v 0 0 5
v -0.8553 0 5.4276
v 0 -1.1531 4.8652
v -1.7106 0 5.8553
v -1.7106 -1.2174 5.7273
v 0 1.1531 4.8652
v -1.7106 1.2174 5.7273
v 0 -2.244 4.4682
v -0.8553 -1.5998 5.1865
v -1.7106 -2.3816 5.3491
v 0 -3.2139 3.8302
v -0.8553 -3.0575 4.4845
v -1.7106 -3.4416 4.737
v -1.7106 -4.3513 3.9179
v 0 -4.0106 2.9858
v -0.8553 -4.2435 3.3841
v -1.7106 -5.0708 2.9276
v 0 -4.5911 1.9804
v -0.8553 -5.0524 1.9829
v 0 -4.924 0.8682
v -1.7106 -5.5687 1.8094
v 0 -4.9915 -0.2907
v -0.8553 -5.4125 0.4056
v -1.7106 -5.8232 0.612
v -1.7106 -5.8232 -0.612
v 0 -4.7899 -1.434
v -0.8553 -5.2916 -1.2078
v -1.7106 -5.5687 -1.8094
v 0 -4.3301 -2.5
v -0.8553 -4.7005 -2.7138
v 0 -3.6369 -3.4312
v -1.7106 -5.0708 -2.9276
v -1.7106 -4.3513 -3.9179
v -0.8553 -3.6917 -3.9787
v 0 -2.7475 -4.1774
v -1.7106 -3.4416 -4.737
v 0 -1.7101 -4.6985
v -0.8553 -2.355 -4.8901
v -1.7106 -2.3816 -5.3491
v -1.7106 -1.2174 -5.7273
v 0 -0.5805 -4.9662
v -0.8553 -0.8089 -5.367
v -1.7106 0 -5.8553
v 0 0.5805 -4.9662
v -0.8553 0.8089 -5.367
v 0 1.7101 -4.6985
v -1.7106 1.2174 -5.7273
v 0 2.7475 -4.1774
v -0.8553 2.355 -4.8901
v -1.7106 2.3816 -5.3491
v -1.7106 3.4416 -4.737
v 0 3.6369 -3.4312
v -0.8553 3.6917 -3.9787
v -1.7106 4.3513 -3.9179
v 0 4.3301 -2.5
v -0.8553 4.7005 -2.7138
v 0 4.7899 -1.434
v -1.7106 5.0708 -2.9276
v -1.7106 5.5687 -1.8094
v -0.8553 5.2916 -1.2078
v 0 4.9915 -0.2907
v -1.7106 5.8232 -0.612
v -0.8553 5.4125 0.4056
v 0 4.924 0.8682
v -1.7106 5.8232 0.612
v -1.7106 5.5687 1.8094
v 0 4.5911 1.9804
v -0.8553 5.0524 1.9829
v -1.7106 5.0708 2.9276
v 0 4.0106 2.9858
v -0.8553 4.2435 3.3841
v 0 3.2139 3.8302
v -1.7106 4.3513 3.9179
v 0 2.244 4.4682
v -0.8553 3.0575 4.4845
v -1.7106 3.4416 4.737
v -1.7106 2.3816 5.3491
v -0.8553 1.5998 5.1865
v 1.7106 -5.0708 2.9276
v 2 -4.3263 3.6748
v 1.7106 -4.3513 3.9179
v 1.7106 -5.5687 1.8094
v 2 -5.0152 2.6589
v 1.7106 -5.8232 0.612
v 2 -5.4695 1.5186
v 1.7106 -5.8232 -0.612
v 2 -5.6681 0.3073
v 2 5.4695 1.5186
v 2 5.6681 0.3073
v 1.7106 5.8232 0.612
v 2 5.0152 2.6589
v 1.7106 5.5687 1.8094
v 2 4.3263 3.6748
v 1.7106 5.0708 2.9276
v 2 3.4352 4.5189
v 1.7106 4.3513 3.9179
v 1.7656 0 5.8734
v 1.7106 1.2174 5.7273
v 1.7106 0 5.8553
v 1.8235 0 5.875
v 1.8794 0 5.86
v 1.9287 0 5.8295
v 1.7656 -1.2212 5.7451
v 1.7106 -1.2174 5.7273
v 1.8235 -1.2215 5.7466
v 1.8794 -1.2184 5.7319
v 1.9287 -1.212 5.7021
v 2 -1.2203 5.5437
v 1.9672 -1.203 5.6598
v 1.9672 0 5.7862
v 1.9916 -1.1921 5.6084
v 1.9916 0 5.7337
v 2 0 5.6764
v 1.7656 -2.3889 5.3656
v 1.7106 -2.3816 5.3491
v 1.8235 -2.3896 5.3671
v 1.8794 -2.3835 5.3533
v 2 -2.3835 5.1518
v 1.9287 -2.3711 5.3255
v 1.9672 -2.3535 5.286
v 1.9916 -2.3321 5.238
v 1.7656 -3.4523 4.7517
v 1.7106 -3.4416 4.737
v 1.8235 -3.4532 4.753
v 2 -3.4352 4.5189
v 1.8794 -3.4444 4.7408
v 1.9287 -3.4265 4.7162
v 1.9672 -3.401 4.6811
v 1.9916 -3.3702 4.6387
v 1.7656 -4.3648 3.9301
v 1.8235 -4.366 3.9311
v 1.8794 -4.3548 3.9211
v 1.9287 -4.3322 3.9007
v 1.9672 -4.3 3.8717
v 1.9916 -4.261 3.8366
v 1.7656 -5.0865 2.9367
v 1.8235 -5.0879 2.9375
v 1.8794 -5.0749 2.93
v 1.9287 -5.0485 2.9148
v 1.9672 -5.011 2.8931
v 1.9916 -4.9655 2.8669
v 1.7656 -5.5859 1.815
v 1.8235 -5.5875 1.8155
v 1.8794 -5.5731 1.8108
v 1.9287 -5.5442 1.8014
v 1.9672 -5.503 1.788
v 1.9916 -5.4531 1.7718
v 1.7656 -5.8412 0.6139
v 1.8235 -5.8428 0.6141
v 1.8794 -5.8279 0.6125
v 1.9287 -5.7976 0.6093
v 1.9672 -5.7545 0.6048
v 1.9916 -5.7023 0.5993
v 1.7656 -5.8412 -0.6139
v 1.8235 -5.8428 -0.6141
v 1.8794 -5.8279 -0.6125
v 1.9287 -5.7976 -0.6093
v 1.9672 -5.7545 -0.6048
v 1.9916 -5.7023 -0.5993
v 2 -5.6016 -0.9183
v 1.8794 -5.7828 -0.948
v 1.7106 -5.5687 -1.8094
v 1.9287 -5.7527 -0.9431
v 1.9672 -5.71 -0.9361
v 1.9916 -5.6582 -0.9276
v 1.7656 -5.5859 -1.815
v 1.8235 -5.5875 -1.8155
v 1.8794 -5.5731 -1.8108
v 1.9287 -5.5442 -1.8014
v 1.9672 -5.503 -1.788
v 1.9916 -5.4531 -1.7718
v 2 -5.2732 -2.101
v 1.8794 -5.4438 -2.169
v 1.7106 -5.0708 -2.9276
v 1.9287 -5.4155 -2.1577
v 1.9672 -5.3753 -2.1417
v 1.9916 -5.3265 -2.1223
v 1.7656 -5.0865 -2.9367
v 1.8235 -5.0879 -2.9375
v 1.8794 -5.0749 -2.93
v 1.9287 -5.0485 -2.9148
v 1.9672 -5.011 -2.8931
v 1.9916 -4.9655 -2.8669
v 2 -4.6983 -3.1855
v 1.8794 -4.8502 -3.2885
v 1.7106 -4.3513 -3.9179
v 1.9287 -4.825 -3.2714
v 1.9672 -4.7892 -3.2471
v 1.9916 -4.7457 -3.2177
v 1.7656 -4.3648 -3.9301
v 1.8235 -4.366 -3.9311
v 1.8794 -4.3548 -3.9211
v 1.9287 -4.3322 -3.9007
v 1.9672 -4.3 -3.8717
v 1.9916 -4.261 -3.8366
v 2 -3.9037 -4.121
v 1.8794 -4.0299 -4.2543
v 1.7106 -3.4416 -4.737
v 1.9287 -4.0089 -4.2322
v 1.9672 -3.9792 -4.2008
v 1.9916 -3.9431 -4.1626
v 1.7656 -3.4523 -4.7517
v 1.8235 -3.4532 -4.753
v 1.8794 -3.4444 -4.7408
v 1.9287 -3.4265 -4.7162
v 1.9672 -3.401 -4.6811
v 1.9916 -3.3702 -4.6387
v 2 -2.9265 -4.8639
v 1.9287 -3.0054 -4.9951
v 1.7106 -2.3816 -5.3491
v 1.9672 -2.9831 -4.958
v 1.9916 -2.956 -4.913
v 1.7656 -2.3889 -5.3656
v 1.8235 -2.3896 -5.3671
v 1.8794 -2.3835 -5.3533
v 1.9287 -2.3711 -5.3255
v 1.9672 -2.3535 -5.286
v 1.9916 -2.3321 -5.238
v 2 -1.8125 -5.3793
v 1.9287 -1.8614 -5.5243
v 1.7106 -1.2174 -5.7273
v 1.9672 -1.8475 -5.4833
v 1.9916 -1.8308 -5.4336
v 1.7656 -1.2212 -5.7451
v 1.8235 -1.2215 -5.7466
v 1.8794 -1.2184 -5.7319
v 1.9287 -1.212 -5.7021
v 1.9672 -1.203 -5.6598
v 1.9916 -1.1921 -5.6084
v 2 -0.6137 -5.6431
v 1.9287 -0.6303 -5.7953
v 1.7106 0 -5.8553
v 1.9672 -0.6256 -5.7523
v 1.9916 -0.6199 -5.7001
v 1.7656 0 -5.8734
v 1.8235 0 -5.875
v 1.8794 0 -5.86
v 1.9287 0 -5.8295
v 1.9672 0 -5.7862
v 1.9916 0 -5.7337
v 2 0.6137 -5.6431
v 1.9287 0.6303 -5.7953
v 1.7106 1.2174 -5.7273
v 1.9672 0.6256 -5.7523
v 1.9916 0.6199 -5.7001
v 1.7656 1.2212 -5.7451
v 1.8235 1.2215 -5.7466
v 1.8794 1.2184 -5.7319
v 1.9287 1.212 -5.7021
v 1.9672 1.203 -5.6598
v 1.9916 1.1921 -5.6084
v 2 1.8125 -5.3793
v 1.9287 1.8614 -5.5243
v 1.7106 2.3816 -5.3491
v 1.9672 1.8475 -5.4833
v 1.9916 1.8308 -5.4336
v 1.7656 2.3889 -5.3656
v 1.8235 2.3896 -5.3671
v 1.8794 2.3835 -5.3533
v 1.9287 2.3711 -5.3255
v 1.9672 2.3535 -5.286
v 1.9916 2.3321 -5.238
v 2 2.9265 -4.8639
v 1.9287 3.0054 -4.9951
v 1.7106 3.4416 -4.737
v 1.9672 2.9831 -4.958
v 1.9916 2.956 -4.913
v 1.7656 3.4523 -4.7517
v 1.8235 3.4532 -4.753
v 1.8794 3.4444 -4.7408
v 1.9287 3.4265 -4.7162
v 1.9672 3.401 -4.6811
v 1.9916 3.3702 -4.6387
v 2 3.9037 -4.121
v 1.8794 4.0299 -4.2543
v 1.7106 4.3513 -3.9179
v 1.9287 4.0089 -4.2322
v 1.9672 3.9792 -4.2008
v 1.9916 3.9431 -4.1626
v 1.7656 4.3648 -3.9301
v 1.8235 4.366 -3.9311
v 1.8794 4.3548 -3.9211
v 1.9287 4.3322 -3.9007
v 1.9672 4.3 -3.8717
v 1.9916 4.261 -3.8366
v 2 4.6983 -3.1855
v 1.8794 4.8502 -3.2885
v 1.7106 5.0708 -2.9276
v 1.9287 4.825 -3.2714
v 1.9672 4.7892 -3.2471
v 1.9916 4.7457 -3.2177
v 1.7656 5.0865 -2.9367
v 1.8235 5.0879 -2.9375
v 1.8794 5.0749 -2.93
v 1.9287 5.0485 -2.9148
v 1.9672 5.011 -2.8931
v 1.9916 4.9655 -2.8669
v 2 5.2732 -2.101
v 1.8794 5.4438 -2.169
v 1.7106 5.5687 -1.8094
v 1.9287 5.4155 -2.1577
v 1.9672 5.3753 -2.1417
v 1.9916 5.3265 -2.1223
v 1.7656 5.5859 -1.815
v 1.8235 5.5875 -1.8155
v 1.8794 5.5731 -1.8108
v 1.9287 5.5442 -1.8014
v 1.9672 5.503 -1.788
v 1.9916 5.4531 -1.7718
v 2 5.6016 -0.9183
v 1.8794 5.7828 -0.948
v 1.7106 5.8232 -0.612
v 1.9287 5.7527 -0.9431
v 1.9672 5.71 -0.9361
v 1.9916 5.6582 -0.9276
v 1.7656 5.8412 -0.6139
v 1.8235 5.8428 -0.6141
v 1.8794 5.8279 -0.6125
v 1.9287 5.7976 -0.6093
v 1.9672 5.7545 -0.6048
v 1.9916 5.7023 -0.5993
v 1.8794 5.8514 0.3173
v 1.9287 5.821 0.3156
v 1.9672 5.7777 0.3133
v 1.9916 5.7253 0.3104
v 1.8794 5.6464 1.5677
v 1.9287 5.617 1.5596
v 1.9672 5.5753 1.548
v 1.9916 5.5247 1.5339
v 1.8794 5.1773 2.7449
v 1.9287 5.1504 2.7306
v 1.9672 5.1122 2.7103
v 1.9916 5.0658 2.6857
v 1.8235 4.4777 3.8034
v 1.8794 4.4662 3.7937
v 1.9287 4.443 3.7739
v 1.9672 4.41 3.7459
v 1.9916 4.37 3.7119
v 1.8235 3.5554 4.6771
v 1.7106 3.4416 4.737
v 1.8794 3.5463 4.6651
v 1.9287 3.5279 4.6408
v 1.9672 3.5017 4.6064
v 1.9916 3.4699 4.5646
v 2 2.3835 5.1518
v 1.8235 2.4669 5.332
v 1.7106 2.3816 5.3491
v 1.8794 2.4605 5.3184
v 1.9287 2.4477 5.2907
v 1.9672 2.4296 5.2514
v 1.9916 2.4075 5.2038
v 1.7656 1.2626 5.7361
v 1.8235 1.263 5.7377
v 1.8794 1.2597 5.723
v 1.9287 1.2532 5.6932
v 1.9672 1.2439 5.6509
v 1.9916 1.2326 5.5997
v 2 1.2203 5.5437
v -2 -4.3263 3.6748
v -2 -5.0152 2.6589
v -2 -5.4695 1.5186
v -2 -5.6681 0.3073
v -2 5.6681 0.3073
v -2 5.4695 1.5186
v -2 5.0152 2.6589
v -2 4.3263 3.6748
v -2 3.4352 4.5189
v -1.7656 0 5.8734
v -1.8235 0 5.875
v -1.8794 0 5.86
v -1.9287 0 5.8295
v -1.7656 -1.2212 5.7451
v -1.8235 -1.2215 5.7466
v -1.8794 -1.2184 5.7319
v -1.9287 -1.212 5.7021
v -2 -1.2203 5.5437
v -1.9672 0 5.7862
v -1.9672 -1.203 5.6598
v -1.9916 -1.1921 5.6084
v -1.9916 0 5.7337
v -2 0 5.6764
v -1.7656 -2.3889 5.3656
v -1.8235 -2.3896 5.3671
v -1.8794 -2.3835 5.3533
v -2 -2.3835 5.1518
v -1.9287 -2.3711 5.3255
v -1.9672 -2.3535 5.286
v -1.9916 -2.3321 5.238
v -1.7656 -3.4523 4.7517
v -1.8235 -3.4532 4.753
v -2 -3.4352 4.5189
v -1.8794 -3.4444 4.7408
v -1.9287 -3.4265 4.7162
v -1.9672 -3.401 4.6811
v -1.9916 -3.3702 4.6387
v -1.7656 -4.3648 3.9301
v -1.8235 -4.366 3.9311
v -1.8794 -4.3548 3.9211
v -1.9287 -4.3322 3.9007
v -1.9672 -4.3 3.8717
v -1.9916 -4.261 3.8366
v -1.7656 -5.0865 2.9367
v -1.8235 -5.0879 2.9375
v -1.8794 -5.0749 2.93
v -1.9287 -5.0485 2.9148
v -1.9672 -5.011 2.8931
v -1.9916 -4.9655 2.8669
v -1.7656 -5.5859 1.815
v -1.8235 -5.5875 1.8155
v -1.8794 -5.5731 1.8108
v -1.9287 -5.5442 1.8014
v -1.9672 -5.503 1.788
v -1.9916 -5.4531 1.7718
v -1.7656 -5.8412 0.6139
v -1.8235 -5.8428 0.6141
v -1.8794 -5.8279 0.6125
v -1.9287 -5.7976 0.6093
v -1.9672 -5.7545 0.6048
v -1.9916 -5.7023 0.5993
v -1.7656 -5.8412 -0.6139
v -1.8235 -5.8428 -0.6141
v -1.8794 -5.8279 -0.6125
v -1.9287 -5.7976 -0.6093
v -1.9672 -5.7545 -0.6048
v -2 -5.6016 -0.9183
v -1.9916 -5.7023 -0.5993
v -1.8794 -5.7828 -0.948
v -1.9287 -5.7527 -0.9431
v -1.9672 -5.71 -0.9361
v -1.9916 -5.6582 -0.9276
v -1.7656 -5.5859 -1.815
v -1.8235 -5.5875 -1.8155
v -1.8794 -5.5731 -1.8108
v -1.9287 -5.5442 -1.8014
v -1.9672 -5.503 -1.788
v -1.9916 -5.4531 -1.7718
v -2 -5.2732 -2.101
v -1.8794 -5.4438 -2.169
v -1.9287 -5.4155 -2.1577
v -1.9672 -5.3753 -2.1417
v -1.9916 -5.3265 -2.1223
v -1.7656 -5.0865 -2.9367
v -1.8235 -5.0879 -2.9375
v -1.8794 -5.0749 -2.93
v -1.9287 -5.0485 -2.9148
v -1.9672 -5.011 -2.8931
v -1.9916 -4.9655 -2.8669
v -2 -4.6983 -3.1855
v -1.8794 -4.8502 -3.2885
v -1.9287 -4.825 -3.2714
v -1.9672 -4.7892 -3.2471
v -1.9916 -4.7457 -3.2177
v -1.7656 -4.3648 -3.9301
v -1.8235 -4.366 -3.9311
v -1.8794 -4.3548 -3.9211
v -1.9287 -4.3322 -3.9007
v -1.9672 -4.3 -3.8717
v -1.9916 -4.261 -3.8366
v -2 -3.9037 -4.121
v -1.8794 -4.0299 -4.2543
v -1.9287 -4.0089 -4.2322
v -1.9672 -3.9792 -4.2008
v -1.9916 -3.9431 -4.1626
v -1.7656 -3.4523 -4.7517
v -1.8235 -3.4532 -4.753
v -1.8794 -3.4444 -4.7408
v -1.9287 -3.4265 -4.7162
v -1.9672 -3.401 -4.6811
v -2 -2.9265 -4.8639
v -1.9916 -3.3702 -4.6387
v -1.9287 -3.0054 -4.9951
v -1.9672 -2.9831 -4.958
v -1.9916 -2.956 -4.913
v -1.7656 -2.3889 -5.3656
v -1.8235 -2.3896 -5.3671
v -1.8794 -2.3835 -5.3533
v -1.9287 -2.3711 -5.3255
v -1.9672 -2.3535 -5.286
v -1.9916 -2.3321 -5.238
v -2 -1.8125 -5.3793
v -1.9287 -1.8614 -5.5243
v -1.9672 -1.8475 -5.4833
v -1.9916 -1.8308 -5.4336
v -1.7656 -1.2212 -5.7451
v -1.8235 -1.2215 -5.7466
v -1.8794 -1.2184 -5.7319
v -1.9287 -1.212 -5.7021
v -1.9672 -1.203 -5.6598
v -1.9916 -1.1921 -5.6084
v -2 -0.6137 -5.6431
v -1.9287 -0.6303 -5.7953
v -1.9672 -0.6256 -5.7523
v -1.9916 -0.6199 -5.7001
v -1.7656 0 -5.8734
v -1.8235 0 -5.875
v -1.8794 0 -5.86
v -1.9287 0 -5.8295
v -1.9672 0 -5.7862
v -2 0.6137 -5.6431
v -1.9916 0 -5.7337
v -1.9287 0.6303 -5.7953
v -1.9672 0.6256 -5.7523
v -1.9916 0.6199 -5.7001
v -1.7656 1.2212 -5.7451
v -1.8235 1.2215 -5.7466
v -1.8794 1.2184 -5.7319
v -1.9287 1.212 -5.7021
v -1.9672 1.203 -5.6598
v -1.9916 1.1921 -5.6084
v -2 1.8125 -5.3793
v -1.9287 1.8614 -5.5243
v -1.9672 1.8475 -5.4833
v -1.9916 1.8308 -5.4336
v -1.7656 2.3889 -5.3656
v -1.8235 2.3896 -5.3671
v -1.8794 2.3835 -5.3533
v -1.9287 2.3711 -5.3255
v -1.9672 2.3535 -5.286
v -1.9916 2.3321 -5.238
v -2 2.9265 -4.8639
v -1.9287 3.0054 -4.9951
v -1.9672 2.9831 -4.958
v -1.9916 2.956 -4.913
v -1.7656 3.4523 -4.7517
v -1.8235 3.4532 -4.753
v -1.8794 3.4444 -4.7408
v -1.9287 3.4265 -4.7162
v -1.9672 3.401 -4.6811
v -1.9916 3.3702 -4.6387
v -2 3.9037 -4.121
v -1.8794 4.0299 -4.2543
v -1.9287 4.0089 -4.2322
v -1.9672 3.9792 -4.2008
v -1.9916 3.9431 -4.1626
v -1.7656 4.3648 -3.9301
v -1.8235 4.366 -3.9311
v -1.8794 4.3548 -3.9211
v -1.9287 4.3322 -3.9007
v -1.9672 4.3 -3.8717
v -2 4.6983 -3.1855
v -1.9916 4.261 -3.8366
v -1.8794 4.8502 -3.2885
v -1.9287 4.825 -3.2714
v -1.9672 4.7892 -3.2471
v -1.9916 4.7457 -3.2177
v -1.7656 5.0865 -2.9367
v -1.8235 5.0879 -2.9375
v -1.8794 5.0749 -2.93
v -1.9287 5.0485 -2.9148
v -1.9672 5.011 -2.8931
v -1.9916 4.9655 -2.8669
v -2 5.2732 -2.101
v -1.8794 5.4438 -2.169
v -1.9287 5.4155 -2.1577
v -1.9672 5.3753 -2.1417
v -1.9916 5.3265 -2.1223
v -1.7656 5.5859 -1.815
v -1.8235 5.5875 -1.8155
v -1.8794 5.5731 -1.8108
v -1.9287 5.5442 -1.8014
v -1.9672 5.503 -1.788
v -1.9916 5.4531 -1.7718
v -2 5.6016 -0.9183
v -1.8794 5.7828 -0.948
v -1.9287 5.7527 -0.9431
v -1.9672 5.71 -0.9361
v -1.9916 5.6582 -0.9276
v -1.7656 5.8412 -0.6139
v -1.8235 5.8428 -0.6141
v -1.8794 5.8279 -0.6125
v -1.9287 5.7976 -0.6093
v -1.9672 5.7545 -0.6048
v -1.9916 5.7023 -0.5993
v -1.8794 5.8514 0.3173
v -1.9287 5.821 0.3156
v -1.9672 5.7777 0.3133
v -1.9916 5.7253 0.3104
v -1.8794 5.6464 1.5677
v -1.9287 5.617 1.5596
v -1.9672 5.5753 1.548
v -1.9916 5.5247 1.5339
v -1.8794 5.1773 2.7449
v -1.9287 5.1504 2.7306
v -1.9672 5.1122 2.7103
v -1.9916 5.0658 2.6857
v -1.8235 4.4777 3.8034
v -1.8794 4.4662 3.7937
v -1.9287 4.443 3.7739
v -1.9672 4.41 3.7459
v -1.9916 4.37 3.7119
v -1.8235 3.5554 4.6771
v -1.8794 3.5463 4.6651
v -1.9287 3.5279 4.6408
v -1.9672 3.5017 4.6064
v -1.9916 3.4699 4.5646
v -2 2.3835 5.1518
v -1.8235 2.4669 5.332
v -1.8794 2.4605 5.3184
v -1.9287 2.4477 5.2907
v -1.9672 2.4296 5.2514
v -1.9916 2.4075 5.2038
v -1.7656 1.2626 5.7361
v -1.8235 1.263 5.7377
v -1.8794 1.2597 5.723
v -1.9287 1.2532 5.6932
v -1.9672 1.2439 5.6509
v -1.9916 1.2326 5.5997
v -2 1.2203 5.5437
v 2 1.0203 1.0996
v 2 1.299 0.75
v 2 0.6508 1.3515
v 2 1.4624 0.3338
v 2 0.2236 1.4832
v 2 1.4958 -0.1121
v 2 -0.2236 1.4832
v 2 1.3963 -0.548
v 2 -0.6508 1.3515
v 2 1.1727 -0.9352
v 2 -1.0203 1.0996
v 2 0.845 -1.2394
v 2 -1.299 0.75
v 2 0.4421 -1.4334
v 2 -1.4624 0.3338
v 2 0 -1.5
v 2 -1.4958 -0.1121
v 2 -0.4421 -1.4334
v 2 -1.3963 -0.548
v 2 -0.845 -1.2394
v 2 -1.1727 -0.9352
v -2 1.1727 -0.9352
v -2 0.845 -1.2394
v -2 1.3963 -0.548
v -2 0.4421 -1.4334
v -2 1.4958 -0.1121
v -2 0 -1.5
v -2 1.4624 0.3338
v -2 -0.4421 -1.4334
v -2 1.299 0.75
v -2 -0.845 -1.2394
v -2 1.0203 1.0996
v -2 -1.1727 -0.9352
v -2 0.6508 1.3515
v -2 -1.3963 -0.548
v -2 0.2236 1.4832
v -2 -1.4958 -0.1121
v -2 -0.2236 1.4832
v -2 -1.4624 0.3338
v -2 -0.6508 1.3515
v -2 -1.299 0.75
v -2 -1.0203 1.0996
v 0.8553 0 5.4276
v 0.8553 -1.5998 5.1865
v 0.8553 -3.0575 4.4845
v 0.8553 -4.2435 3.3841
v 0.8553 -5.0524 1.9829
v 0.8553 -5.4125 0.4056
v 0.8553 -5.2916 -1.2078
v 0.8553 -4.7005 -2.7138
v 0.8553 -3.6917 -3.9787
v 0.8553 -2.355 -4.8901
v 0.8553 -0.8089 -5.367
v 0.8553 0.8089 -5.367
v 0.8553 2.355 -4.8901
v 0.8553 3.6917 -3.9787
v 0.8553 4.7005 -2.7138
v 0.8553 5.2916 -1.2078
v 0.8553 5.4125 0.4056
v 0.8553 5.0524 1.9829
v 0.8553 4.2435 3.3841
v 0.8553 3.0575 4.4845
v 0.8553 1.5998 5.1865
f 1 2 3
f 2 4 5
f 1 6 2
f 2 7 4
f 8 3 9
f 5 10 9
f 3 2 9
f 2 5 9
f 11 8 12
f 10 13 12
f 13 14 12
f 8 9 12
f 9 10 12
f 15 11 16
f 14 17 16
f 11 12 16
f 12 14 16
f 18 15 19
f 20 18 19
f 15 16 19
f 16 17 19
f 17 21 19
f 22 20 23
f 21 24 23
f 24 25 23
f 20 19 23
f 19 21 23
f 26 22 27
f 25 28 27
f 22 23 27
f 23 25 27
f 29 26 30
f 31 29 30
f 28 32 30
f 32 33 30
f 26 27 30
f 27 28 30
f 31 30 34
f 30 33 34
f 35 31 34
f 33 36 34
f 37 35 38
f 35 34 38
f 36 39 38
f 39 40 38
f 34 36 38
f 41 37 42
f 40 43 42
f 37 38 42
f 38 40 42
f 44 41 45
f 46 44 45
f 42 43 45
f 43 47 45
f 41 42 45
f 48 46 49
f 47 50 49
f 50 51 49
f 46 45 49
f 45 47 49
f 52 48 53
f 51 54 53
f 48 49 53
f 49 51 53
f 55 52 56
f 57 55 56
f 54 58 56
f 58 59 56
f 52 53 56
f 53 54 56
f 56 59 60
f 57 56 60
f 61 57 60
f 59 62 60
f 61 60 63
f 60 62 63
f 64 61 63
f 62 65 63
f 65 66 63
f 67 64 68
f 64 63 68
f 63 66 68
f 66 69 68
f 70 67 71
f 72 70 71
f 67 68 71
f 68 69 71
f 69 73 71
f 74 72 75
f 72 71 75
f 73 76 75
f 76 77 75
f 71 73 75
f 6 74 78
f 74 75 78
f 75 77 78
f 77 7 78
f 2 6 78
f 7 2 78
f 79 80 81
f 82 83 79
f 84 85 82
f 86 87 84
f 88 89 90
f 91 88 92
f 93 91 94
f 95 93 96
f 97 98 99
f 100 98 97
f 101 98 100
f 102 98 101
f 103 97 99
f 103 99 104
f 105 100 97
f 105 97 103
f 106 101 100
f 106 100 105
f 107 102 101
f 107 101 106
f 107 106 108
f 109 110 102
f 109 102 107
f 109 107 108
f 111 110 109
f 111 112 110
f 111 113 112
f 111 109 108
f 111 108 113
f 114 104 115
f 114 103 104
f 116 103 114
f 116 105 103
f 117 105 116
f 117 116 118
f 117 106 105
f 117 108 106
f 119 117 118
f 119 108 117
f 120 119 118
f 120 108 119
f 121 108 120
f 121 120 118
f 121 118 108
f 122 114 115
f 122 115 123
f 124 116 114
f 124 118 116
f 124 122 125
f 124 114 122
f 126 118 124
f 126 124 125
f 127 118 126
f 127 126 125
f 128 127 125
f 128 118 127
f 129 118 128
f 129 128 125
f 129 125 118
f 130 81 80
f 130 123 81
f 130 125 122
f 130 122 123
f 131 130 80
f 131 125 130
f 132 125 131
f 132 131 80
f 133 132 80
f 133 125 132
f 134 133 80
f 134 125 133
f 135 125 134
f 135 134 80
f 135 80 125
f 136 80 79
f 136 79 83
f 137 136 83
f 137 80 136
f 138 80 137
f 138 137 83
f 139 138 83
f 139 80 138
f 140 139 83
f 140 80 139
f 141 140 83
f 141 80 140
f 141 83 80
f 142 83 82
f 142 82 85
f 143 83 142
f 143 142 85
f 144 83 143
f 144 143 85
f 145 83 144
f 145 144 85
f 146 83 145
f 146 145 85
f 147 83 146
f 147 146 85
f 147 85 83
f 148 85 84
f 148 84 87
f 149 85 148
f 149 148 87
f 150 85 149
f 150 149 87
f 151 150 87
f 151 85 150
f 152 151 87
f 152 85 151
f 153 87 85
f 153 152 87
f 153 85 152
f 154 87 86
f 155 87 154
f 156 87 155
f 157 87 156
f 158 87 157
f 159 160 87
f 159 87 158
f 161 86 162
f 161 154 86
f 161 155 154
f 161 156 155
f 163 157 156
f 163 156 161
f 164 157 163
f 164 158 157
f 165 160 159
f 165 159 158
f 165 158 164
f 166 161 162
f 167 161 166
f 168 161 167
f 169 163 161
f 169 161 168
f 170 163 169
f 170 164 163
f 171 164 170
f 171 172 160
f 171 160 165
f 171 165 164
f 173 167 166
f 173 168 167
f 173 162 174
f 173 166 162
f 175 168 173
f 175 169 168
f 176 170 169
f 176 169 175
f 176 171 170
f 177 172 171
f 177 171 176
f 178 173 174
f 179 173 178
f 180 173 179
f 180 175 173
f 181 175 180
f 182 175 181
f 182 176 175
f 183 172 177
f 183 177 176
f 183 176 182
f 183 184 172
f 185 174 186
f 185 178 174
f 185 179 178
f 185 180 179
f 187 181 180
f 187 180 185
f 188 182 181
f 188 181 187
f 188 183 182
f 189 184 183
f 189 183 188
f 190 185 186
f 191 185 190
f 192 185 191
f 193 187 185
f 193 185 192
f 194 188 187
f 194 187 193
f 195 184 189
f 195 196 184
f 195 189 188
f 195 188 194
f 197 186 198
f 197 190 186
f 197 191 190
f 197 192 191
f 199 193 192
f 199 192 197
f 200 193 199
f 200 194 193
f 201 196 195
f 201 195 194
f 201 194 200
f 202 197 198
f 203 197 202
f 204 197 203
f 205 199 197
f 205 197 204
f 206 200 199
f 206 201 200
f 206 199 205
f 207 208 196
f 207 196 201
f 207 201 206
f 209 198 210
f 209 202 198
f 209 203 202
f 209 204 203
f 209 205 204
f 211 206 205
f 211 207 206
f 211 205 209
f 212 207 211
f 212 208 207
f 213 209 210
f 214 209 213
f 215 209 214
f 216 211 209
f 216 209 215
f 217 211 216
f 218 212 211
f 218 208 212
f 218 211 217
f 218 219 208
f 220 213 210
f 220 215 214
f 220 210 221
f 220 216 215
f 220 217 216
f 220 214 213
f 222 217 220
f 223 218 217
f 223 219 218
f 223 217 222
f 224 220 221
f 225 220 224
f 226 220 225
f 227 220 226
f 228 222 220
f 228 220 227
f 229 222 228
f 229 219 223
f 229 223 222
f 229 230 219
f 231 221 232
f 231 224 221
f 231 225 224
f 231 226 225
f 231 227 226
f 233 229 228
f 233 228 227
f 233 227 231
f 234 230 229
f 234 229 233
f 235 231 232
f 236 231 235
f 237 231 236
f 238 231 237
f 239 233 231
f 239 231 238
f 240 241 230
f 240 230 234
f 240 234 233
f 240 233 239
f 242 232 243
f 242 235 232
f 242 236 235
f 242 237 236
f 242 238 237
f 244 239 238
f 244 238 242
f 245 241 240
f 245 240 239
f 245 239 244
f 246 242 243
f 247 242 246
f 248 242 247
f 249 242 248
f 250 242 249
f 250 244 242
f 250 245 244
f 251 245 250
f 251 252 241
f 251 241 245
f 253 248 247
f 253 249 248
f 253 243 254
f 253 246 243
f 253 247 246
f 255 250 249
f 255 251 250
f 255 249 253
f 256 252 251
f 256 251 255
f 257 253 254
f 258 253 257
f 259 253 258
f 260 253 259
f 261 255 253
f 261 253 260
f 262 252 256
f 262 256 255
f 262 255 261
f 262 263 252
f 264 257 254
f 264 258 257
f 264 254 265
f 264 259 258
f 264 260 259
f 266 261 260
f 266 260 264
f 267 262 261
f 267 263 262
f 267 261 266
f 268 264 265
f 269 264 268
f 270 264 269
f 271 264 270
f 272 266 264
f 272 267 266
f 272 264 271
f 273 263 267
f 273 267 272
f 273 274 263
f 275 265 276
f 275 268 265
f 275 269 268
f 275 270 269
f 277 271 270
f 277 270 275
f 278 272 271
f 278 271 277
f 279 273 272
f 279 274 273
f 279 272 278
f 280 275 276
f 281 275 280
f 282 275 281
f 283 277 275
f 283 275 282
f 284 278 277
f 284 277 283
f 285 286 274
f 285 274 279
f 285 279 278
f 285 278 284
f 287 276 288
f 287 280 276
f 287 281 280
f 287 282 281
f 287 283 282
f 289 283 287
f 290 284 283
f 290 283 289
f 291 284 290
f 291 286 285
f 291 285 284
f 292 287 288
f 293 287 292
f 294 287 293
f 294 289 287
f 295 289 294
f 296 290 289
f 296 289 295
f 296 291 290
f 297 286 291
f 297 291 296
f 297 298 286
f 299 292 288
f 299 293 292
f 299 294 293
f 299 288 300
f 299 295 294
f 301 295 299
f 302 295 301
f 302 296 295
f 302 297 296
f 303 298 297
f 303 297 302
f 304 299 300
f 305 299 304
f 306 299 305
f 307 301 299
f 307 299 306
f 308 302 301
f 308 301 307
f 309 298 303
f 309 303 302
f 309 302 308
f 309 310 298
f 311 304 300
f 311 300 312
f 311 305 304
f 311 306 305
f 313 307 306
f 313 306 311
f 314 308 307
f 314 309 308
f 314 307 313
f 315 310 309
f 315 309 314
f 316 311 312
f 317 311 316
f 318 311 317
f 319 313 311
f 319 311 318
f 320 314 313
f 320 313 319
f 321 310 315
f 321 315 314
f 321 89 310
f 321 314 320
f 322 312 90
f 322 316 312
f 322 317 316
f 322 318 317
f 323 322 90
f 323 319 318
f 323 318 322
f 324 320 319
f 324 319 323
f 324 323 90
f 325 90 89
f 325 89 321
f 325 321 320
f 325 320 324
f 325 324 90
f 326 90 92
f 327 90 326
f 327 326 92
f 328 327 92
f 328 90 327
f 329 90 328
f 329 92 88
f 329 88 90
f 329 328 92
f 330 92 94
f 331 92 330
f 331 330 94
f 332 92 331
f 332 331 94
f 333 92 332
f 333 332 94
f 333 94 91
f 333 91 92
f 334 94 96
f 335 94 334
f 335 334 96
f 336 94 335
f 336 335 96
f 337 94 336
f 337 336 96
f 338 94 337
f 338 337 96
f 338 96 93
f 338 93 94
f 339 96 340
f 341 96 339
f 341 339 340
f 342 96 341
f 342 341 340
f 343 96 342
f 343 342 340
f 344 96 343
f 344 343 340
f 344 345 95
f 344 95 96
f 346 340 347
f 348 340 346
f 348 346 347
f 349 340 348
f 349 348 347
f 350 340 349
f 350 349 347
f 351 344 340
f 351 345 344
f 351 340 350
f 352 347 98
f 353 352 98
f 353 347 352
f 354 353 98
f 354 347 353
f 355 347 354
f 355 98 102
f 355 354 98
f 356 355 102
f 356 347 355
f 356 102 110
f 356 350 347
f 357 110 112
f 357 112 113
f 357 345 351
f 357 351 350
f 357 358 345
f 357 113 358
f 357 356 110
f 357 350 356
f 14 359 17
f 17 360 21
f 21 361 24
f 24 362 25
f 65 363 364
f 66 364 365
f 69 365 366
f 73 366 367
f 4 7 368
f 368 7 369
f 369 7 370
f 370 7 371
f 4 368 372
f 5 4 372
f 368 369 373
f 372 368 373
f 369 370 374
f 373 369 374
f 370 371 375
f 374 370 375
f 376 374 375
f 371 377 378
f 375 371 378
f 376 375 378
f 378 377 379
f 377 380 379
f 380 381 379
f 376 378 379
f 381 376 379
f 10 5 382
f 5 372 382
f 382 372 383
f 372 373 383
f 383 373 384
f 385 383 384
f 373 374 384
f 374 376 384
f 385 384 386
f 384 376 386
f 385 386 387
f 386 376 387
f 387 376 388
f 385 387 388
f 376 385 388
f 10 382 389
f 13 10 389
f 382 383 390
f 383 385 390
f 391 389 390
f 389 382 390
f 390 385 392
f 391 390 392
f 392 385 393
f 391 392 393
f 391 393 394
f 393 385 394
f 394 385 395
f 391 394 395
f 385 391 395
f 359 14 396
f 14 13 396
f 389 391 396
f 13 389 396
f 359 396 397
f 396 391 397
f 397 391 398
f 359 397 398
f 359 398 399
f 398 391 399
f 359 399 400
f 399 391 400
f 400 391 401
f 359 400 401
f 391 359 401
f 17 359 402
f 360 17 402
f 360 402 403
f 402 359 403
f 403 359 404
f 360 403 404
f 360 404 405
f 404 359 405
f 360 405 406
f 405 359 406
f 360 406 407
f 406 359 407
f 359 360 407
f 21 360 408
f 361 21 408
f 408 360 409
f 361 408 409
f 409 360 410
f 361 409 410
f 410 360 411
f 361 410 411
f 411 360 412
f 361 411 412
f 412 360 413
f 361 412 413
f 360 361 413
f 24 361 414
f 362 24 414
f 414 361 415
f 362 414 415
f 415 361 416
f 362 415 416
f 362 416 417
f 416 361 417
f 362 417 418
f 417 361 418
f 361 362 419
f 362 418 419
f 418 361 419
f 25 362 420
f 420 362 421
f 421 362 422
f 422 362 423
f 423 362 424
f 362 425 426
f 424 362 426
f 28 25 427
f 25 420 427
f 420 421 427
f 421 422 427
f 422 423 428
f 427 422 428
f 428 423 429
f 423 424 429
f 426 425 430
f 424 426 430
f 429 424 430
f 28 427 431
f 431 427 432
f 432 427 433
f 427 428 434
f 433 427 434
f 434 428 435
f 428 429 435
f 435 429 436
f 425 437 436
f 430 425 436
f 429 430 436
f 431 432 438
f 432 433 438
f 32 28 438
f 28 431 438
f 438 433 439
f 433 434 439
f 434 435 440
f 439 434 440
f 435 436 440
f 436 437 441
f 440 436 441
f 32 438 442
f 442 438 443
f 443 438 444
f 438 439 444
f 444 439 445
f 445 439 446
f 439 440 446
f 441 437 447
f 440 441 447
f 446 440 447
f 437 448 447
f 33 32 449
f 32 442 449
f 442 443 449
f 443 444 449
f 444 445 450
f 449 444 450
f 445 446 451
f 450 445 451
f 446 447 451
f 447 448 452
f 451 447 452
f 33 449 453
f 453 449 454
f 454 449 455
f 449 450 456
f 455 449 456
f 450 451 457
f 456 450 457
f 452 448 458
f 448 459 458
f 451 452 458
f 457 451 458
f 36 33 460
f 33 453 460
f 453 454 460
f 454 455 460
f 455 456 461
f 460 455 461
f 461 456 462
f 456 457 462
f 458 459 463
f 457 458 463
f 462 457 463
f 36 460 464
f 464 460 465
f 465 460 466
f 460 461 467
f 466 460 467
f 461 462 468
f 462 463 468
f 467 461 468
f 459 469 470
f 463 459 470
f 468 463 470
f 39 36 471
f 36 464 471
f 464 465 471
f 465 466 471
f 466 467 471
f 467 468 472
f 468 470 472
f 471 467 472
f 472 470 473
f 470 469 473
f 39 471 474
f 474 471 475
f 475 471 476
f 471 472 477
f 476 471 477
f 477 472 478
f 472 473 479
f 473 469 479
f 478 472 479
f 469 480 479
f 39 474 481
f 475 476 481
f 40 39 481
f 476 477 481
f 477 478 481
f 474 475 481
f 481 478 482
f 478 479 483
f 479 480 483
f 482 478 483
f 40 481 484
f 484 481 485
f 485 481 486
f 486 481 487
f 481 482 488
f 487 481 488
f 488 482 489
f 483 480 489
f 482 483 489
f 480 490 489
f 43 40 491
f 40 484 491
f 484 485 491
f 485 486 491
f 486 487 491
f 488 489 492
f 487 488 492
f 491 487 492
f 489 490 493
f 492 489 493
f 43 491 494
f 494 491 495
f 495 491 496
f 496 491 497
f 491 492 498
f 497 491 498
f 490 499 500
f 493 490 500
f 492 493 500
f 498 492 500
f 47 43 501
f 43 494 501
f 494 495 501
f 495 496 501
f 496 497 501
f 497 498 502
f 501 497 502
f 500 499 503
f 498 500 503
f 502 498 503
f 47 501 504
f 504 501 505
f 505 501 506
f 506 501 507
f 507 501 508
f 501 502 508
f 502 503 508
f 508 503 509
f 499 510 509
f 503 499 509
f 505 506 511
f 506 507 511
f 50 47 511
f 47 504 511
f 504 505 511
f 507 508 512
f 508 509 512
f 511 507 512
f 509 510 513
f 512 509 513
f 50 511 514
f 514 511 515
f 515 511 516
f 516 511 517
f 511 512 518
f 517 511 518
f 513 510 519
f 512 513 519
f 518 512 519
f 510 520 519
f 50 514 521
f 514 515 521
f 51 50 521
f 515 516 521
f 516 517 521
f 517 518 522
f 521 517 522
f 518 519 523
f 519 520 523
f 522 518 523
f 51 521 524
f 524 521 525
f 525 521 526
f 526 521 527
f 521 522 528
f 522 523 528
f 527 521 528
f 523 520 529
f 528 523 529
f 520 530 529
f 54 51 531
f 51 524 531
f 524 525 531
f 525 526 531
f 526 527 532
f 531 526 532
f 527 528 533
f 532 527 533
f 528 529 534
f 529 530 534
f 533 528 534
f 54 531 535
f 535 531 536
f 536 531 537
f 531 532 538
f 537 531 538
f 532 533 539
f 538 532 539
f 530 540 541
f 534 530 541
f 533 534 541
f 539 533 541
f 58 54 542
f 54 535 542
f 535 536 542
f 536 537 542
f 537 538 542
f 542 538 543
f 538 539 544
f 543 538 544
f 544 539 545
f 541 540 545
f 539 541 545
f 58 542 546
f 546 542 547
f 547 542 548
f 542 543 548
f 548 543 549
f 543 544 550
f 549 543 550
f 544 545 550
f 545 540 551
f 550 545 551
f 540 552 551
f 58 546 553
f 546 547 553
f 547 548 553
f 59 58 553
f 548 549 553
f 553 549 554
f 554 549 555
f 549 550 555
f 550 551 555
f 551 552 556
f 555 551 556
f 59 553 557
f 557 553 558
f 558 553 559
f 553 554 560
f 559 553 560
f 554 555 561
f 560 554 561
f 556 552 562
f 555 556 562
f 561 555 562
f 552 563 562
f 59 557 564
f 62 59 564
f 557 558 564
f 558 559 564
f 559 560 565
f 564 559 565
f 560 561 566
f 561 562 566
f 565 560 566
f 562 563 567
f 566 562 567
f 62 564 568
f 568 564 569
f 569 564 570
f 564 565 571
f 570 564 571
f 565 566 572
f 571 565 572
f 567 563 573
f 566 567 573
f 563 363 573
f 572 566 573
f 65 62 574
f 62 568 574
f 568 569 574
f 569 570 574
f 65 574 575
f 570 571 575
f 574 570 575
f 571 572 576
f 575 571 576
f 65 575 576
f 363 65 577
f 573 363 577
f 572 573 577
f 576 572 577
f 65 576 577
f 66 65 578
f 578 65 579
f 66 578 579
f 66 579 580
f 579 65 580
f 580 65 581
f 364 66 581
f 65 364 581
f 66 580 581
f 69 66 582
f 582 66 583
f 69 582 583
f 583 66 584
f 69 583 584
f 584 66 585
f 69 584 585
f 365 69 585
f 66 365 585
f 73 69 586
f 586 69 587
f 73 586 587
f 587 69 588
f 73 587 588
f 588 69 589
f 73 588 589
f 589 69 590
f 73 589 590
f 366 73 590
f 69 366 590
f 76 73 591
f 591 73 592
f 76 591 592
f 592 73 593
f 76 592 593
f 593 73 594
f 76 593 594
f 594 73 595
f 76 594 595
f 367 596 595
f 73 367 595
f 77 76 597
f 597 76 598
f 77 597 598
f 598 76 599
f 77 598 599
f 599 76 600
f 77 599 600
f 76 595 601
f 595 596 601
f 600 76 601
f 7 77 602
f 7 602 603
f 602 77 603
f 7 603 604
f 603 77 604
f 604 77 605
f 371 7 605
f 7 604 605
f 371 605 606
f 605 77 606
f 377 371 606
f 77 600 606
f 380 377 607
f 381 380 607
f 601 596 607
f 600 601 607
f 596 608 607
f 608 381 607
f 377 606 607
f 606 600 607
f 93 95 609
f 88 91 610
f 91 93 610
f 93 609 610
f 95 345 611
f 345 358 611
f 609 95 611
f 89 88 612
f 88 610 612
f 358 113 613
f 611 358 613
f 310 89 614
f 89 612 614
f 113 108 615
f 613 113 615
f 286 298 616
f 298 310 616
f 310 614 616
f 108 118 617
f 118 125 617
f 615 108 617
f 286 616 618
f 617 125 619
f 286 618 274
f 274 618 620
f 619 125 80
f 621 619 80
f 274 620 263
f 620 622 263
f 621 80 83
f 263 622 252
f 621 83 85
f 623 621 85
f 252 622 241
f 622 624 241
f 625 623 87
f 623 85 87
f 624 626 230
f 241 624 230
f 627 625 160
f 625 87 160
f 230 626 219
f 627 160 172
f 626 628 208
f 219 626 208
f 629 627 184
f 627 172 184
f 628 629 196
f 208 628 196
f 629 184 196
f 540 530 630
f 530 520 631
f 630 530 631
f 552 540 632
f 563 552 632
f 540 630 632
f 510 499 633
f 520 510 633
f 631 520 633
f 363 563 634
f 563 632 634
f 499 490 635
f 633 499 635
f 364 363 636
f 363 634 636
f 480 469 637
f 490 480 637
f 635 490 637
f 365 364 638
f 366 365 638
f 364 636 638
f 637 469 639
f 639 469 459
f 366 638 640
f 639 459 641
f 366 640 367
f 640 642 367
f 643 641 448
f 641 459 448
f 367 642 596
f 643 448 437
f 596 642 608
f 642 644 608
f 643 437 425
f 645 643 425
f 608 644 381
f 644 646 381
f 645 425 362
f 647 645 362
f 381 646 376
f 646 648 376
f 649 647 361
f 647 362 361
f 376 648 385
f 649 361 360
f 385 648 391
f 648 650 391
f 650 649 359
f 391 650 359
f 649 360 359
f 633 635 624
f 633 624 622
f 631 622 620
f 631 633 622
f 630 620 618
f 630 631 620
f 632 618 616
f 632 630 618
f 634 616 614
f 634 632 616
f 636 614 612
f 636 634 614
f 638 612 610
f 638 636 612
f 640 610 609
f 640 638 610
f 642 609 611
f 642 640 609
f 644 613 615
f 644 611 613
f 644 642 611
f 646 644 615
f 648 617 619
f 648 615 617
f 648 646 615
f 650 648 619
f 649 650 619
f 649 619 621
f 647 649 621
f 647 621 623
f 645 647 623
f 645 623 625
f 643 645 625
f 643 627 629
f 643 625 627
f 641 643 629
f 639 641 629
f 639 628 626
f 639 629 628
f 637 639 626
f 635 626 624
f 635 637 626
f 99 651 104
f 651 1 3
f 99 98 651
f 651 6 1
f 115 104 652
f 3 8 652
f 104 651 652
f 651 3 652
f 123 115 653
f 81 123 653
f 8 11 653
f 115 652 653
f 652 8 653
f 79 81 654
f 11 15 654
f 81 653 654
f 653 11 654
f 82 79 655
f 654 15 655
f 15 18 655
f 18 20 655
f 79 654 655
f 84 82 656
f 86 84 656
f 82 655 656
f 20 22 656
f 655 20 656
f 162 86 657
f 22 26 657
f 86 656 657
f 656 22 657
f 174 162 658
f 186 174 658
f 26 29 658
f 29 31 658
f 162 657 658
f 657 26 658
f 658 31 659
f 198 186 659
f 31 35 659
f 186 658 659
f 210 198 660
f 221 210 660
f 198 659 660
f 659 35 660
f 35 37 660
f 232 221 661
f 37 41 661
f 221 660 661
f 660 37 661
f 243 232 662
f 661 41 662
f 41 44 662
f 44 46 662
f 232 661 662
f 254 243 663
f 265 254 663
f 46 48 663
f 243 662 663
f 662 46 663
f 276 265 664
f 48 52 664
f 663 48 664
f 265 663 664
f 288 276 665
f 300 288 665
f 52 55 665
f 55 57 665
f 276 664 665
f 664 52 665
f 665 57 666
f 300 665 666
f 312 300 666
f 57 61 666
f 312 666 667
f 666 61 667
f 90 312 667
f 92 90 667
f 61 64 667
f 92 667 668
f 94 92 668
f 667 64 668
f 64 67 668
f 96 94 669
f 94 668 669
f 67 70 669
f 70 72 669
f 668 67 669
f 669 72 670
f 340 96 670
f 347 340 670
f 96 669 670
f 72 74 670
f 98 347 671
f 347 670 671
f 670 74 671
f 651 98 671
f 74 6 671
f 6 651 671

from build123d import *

# Parameters (mm, degrees)
CUT_EXTRUDE1_DEPTH      = 9.717797887
CUT_EXTRUDE1_DEPTH_BACK = 9.717797887
SKETCH2_R               = 1.5
FILLET2_R               = 0.2


with BuildPart() as part:
    # Sketch1 → Revolve1 (revolve)
    with BuildSketch(Plane.XY, mode=Mode.PRIVATE) as revolve1_sk:
        Polygon((0, 5), (-2, 6), (-2, 0), (2, 0), (2, 6), align=None)
    revolve(revolve1_sk.sketch.rotate(Axis((-9.793827425, 0, 0), (1, 0, 0)), 90), axis=Axis((-9.793827425, 0, 0), (1, 0, 0)))

    # Sketch2 → Cut-Extrude1 (cut, two sides: drawn at the far end of the back side and taken through both)
    with BuildSketch(Plane(origin=(0, 0, 0), x_dir=(0, 0, -1), z_dir=(1, 0, 0)).offset(-CUT_EXTRUDE1_DEPTH_BACK)):
        Circle(SKETCH2_R)
    extrude(amount=CUT_EXTRUDE1_DEPTH + CUT_EXTRUDE1_DEPTH_BACK, mode=Mode.SUBTRACT)

    # Fillet2
    fillet2_edges = [part.edges().sort_by_distance(p)[0] for p in [
        (-2, 0, -6),
        (2, 0, -6),
    ]]
    fillet(fillet2_edges, radius=FILLET2_R)


solid = part.part
